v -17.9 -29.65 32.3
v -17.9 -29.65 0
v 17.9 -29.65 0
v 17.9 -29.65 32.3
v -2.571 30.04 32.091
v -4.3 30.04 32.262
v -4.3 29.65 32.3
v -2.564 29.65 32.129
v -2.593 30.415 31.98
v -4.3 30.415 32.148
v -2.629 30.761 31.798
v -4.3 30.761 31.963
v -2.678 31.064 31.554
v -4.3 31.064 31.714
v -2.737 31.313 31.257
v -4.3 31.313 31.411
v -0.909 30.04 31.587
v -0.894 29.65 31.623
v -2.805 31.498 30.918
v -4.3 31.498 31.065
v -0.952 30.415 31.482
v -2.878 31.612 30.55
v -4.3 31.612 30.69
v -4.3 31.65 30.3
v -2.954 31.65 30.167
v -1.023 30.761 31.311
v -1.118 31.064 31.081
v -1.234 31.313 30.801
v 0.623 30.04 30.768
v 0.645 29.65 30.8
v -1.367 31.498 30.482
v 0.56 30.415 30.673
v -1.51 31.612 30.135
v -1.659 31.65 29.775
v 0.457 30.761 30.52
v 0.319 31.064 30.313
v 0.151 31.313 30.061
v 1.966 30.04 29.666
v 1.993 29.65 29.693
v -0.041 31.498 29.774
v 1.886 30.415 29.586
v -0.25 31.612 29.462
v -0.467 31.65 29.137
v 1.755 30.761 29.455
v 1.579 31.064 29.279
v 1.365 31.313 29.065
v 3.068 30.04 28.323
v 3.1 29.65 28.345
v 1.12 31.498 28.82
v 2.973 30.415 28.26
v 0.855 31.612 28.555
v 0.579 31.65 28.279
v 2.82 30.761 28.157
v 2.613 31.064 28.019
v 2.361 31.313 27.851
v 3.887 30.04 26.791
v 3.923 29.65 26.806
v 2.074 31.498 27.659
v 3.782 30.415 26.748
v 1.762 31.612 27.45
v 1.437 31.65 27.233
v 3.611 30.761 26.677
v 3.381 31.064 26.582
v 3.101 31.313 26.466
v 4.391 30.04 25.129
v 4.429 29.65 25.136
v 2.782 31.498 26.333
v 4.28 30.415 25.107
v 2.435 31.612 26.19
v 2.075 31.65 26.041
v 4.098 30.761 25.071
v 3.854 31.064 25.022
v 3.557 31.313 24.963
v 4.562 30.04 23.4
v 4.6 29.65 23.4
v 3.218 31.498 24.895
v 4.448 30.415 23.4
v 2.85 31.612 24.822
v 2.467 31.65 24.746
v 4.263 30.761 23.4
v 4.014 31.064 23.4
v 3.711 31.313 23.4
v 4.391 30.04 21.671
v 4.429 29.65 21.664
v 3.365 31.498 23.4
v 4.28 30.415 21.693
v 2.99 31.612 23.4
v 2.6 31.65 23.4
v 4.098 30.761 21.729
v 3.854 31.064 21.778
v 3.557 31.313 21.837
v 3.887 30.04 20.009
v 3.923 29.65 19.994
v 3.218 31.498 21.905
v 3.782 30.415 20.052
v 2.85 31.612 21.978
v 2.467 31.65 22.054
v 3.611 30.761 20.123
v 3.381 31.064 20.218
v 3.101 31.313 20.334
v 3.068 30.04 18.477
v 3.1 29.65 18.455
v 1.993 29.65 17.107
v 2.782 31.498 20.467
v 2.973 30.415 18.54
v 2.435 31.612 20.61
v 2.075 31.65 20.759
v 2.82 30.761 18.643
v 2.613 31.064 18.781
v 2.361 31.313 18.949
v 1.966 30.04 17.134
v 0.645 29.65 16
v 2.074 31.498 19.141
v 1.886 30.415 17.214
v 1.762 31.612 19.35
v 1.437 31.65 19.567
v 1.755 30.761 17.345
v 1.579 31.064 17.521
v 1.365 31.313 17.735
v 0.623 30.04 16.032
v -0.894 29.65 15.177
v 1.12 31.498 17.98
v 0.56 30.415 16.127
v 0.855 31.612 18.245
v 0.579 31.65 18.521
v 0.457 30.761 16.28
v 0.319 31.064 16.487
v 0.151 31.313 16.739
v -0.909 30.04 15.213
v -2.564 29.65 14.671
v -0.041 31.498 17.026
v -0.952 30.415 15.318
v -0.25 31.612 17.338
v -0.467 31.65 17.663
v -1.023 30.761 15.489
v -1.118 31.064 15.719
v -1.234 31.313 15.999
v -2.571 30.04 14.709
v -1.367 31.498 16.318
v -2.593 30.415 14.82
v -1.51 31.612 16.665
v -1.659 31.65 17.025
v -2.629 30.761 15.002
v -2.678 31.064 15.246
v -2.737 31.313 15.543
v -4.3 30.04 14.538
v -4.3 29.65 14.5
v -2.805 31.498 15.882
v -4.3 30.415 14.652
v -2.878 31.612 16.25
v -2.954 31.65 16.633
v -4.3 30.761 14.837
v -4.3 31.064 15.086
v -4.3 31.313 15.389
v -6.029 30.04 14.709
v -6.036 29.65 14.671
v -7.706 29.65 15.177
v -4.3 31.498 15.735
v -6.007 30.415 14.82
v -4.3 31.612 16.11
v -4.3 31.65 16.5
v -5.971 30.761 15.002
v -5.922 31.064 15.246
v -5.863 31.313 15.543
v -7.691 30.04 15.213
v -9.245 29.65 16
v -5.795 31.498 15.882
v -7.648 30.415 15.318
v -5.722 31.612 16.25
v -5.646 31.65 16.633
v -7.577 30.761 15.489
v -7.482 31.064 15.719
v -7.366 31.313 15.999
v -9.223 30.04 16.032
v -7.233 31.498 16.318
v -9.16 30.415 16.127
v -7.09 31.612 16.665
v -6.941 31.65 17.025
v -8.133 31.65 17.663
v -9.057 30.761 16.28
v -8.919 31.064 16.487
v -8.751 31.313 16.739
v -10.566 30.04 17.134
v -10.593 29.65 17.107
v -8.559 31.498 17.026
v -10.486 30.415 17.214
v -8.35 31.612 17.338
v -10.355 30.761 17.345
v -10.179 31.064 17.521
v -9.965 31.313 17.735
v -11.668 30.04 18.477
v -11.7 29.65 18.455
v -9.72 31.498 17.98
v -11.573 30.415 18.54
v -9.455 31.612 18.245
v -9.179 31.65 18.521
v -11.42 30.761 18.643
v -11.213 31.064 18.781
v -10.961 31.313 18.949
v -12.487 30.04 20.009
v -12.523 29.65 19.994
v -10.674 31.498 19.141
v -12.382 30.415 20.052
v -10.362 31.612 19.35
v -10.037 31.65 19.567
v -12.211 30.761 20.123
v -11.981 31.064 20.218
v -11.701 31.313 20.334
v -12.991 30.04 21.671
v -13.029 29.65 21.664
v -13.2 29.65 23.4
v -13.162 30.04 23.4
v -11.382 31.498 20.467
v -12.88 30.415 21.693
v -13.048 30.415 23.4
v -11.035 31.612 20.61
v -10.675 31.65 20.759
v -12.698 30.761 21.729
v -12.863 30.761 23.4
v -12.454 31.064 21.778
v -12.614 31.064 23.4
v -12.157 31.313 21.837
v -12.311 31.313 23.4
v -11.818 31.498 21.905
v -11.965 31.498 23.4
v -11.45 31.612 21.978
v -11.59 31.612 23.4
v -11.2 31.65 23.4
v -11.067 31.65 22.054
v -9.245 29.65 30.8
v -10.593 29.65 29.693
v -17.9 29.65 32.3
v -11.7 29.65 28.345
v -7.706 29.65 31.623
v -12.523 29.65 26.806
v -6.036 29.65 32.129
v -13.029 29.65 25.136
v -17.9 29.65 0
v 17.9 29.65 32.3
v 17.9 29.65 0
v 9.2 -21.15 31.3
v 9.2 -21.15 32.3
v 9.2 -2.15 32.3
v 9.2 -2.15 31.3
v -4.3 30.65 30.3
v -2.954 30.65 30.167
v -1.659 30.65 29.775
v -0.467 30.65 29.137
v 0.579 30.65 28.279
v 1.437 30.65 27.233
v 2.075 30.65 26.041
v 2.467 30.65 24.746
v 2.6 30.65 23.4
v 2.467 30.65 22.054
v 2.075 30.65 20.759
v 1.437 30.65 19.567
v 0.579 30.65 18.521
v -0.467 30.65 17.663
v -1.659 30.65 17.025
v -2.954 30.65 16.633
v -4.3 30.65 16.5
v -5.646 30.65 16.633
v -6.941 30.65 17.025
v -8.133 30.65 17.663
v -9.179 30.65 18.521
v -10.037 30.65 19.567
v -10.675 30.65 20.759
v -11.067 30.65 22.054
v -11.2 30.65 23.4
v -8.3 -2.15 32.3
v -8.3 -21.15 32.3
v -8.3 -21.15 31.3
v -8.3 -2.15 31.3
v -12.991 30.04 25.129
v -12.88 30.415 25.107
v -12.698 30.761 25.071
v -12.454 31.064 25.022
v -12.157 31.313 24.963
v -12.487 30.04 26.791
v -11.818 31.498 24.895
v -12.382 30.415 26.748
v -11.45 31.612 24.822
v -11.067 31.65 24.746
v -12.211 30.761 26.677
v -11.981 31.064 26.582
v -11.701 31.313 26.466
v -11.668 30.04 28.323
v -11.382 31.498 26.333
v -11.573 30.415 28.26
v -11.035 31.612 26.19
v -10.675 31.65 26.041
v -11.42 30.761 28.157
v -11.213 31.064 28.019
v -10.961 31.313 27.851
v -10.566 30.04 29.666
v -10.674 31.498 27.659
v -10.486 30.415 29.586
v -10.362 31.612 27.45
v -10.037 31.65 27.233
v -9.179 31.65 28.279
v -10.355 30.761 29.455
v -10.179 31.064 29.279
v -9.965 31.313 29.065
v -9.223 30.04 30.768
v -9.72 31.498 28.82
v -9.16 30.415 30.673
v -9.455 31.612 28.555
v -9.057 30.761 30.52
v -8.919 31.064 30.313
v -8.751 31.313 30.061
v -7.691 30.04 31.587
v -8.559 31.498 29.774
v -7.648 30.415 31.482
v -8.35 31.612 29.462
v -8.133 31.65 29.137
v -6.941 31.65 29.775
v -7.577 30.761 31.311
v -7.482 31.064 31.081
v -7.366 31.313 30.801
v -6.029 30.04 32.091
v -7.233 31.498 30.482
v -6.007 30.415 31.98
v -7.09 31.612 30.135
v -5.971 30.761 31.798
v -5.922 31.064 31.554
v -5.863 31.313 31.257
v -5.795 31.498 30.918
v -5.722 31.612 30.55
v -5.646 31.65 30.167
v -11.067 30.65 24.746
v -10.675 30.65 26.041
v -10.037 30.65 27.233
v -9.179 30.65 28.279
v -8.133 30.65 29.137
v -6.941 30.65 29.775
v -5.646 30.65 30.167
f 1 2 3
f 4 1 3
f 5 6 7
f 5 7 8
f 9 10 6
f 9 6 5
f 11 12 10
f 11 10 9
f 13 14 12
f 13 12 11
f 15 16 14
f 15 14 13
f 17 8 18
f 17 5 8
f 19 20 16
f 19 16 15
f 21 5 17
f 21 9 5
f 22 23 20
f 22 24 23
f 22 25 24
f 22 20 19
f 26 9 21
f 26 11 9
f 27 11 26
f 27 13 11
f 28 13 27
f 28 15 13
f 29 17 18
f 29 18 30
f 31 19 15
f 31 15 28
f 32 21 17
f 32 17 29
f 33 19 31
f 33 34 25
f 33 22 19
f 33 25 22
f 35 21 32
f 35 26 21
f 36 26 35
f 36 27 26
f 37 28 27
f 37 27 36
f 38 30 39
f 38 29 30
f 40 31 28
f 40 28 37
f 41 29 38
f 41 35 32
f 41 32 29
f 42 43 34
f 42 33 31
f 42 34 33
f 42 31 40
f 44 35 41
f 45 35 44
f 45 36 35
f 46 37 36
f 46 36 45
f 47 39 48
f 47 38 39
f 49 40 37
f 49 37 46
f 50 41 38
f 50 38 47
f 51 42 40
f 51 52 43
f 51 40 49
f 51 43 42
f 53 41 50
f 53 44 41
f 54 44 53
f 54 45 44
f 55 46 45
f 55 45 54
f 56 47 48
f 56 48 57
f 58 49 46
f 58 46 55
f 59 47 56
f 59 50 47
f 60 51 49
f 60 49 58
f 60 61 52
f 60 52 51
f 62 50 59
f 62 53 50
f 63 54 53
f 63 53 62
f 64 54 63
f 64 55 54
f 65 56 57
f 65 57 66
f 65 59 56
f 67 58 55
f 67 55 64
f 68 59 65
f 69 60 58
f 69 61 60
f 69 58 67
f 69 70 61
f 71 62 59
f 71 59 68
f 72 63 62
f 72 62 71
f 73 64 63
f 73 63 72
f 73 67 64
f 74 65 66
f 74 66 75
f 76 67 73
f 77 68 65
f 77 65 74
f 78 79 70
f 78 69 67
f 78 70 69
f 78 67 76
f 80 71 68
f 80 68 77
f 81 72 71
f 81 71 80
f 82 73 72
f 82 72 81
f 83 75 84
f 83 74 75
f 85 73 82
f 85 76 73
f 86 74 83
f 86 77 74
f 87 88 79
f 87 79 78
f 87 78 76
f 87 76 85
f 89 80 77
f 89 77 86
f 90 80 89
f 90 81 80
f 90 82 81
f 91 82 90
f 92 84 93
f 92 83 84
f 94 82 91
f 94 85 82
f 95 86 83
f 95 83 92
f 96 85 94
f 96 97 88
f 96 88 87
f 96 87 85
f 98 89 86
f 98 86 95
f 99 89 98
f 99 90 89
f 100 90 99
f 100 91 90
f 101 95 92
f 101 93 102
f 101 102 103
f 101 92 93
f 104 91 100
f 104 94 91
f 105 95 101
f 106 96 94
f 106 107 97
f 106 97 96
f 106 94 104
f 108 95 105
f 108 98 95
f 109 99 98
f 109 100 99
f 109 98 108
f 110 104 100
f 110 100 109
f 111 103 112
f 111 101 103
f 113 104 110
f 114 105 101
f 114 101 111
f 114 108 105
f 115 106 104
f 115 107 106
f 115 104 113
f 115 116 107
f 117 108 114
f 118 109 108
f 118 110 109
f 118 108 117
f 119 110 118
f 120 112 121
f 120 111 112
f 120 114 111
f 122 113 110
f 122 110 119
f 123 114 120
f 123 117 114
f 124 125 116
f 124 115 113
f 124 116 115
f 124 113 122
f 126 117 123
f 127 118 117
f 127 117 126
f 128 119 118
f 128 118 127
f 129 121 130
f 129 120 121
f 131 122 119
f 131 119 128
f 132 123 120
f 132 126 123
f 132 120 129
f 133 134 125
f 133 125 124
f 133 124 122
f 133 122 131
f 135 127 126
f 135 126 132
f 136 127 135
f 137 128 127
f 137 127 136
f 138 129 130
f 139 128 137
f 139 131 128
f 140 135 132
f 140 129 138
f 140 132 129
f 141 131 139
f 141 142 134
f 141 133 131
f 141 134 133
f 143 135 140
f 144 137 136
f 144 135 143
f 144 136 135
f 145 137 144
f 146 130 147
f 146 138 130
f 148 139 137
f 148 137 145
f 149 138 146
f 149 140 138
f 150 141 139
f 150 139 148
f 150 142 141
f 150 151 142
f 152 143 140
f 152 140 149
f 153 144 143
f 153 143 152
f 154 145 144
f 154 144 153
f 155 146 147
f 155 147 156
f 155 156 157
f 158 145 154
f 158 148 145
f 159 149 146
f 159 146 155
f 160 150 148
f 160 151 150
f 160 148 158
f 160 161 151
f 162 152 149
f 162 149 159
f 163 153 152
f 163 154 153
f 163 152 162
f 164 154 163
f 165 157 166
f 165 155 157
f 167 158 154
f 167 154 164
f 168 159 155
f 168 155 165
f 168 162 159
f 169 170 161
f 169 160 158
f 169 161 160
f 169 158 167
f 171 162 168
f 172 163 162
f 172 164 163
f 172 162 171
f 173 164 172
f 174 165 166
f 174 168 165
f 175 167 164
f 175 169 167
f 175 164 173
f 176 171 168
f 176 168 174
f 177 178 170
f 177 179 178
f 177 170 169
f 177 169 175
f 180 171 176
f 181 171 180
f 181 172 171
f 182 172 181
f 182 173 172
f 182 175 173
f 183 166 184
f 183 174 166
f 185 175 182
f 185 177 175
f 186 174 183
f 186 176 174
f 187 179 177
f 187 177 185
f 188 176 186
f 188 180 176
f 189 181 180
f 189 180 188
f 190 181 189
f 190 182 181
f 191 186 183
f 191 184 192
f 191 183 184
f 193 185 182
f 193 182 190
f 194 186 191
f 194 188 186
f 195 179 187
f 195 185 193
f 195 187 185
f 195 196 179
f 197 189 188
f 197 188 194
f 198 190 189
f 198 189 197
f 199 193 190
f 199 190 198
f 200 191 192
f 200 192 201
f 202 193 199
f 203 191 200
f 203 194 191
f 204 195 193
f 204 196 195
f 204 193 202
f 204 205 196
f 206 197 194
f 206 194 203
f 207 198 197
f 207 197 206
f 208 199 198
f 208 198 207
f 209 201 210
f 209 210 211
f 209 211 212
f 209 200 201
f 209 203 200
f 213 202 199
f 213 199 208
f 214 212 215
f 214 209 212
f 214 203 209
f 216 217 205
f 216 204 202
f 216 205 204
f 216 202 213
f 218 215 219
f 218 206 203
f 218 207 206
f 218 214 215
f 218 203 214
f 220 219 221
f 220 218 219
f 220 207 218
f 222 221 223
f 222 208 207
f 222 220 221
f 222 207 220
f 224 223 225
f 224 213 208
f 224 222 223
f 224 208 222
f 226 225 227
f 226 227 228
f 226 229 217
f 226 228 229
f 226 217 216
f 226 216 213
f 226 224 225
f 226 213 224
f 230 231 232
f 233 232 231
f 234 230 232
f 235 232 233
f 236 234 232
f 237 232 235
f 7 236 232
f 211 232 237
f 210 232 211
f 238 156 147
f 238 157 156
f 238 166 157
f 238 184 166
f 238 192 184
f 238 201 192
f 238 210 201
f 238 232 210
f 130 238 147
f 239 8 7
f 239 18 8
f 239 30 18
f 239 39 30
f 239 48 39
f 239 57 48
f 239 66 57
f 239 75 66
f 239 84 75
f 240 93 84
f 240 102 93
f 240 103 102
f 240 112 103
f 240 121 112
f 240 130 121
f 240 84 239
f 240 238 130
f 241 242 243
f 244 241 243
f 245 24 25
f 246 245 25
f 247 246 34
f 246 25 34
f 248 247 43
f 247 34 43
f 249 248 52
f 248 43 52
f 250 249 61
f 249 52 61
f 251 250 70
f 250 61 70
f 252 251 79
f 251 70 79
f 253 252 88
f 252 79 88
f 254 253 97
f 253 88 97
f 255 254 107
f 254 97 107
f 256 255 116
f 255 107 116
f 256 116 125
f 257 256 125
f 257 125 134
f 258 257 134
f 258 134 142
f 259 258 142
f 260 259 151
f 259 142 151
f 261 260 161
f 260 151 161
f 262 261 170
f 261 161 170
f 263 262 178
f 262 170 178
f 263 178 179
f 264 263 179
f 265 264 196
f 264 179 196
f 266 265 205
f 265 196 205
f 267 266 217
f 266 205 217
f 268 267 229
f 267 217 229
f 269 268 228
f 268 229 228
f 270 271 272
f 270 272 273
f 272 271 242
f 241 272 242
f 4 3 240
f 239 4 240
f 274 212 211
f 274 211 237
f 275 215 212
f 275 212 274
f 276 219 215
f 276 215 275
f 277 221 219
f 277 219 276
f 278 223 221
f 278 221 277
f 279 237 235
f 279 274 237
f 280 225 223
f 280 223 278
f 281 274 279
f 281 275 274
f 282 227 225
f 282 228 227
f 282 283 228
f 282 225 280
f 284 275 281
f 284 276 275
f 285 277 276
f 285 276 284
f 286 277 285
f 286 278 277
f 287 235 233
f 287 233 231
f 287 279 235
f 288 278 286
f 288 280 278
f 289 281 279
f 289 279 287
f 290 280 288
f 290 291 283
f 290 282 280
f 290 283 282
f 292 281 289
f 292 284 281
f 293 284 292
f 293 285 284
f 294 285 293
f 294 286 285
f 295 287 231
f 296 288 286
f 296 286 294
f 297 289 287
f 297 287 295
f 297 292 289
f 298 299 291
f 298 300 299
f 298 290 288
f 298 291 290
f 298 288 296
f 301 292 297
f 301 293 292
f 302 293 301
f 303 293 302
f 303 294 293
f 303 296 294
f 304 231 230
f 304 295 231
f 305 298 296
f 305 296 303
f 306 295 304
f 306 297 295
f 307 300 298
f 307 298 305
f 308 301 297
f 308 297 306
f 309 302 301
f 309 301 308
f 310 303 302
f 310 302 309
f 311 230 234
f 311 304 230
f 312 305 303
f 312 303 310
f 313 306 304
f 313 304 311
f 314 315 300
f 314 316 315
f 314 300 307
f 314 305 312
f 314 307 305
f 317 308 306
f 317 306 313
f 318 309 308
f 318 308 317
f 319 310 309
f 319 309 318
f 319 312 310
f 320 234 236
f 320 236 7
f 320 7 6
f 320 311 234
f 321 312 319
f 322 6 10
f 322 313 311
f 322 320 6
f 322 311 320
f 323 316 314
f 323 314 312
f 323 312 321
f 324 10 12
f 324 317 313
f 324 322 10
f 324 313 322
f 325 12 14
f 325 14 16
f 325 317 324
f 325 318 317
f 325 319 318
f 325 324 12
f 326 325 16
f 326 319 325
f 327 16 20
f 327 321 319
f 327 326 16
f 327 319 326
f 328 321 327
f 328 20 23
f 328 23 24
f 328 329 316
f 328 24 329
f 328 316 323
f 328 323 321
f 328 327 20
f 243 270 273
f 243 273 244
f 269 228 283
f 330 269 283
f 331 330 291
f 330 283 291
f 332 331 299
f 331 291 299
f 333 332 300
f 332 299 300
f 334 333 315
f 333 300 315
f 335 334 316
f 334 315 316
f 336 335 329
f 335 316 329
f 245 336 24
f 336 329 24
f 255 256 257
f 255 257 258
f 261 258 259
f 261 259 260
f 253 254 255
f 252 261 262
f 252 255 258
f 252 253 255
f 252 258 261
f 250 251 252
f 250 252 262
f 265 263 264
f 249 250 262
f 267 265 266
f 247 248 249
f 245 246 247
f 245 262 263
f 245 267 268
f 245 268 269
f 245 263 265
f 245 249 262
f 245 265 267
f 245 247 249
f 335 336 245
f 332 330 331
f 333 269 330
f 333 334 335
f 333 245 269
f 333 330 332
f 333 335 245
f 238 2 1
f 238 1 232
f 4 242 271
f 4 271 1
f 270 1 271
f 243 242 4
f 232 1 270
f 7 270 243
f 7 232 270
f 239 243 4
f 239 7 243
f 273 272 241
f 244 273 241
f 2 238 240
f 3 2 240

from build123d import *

# Parameters (mm, degrees)
F0_W     = 35.8
F0_H     = 59.3
F1_DEPTH = 32.3
F2_W     = 17.5
F2_H     = 19
F3_DEPTH = 1
F5_DEPTH = 2
F6_R     = 1.99999
F7_DEPTH = 1


# Not quite as in the source:
# - a fillet or chamfer is up to 0.001 mm smaller than in the source, because OpenCascade refuses the exact size


with BuildPart() as f1:
    # F0 (on Top) → F1 (new body)
    with BuildSketch(Plane.XY):
        Rectangle(F0_W, F0_H)
    extrude(amount=F1_DEPTH)

    # F2 (on face) → F3 (cut)
    with BuildSketch(Plane.XY.offset(32.3)):
        with Locations((0.45, -11.65)):
            Rectangle(F2_W, F2_H)
    extrude(amount=-F3_DEPTH, mode=Mode.SUBTRACT)

    # F4 (on face) → F5 (join)
    with BuildSketch(Plane(origin=(0, 29.65, 0), x_dir=(-1, 0, 0), z_dir=(0, 1, 0))):
        with BuildLine():
            ThreePointArc((4.3000000252, 32.3), (-1.9932503615, 17.1067496563), (13.2, 23.4))
            ThreePointArc((13.2, 23.4), (10.5932503615, 29.6932503437), (4.3000000252, 32.3))
        make_face()
    extrude(amount=F5_DEPTH)

    # F6 (radius 2 in the source; OpenCascade refuses exactly that, so slightly less here)
    f6_edges = [f1.edges().sort_by_distance(p)[0] for p in [
        (4.6, 31.65, 23.4),
    ]]
    fillet(f6_edges, radius=F6_R)

    # F7 (cut): a face of the model
    f7_faces = [f1.faces().sort_by_distance(p)[0] for p in [
        (-4.3, 31.65, 23.4),
    ]]
    extrude(f7_faces, amount=-F7_DEPTH, mode=Mode.SUBTRACT)


solid = f1.part
